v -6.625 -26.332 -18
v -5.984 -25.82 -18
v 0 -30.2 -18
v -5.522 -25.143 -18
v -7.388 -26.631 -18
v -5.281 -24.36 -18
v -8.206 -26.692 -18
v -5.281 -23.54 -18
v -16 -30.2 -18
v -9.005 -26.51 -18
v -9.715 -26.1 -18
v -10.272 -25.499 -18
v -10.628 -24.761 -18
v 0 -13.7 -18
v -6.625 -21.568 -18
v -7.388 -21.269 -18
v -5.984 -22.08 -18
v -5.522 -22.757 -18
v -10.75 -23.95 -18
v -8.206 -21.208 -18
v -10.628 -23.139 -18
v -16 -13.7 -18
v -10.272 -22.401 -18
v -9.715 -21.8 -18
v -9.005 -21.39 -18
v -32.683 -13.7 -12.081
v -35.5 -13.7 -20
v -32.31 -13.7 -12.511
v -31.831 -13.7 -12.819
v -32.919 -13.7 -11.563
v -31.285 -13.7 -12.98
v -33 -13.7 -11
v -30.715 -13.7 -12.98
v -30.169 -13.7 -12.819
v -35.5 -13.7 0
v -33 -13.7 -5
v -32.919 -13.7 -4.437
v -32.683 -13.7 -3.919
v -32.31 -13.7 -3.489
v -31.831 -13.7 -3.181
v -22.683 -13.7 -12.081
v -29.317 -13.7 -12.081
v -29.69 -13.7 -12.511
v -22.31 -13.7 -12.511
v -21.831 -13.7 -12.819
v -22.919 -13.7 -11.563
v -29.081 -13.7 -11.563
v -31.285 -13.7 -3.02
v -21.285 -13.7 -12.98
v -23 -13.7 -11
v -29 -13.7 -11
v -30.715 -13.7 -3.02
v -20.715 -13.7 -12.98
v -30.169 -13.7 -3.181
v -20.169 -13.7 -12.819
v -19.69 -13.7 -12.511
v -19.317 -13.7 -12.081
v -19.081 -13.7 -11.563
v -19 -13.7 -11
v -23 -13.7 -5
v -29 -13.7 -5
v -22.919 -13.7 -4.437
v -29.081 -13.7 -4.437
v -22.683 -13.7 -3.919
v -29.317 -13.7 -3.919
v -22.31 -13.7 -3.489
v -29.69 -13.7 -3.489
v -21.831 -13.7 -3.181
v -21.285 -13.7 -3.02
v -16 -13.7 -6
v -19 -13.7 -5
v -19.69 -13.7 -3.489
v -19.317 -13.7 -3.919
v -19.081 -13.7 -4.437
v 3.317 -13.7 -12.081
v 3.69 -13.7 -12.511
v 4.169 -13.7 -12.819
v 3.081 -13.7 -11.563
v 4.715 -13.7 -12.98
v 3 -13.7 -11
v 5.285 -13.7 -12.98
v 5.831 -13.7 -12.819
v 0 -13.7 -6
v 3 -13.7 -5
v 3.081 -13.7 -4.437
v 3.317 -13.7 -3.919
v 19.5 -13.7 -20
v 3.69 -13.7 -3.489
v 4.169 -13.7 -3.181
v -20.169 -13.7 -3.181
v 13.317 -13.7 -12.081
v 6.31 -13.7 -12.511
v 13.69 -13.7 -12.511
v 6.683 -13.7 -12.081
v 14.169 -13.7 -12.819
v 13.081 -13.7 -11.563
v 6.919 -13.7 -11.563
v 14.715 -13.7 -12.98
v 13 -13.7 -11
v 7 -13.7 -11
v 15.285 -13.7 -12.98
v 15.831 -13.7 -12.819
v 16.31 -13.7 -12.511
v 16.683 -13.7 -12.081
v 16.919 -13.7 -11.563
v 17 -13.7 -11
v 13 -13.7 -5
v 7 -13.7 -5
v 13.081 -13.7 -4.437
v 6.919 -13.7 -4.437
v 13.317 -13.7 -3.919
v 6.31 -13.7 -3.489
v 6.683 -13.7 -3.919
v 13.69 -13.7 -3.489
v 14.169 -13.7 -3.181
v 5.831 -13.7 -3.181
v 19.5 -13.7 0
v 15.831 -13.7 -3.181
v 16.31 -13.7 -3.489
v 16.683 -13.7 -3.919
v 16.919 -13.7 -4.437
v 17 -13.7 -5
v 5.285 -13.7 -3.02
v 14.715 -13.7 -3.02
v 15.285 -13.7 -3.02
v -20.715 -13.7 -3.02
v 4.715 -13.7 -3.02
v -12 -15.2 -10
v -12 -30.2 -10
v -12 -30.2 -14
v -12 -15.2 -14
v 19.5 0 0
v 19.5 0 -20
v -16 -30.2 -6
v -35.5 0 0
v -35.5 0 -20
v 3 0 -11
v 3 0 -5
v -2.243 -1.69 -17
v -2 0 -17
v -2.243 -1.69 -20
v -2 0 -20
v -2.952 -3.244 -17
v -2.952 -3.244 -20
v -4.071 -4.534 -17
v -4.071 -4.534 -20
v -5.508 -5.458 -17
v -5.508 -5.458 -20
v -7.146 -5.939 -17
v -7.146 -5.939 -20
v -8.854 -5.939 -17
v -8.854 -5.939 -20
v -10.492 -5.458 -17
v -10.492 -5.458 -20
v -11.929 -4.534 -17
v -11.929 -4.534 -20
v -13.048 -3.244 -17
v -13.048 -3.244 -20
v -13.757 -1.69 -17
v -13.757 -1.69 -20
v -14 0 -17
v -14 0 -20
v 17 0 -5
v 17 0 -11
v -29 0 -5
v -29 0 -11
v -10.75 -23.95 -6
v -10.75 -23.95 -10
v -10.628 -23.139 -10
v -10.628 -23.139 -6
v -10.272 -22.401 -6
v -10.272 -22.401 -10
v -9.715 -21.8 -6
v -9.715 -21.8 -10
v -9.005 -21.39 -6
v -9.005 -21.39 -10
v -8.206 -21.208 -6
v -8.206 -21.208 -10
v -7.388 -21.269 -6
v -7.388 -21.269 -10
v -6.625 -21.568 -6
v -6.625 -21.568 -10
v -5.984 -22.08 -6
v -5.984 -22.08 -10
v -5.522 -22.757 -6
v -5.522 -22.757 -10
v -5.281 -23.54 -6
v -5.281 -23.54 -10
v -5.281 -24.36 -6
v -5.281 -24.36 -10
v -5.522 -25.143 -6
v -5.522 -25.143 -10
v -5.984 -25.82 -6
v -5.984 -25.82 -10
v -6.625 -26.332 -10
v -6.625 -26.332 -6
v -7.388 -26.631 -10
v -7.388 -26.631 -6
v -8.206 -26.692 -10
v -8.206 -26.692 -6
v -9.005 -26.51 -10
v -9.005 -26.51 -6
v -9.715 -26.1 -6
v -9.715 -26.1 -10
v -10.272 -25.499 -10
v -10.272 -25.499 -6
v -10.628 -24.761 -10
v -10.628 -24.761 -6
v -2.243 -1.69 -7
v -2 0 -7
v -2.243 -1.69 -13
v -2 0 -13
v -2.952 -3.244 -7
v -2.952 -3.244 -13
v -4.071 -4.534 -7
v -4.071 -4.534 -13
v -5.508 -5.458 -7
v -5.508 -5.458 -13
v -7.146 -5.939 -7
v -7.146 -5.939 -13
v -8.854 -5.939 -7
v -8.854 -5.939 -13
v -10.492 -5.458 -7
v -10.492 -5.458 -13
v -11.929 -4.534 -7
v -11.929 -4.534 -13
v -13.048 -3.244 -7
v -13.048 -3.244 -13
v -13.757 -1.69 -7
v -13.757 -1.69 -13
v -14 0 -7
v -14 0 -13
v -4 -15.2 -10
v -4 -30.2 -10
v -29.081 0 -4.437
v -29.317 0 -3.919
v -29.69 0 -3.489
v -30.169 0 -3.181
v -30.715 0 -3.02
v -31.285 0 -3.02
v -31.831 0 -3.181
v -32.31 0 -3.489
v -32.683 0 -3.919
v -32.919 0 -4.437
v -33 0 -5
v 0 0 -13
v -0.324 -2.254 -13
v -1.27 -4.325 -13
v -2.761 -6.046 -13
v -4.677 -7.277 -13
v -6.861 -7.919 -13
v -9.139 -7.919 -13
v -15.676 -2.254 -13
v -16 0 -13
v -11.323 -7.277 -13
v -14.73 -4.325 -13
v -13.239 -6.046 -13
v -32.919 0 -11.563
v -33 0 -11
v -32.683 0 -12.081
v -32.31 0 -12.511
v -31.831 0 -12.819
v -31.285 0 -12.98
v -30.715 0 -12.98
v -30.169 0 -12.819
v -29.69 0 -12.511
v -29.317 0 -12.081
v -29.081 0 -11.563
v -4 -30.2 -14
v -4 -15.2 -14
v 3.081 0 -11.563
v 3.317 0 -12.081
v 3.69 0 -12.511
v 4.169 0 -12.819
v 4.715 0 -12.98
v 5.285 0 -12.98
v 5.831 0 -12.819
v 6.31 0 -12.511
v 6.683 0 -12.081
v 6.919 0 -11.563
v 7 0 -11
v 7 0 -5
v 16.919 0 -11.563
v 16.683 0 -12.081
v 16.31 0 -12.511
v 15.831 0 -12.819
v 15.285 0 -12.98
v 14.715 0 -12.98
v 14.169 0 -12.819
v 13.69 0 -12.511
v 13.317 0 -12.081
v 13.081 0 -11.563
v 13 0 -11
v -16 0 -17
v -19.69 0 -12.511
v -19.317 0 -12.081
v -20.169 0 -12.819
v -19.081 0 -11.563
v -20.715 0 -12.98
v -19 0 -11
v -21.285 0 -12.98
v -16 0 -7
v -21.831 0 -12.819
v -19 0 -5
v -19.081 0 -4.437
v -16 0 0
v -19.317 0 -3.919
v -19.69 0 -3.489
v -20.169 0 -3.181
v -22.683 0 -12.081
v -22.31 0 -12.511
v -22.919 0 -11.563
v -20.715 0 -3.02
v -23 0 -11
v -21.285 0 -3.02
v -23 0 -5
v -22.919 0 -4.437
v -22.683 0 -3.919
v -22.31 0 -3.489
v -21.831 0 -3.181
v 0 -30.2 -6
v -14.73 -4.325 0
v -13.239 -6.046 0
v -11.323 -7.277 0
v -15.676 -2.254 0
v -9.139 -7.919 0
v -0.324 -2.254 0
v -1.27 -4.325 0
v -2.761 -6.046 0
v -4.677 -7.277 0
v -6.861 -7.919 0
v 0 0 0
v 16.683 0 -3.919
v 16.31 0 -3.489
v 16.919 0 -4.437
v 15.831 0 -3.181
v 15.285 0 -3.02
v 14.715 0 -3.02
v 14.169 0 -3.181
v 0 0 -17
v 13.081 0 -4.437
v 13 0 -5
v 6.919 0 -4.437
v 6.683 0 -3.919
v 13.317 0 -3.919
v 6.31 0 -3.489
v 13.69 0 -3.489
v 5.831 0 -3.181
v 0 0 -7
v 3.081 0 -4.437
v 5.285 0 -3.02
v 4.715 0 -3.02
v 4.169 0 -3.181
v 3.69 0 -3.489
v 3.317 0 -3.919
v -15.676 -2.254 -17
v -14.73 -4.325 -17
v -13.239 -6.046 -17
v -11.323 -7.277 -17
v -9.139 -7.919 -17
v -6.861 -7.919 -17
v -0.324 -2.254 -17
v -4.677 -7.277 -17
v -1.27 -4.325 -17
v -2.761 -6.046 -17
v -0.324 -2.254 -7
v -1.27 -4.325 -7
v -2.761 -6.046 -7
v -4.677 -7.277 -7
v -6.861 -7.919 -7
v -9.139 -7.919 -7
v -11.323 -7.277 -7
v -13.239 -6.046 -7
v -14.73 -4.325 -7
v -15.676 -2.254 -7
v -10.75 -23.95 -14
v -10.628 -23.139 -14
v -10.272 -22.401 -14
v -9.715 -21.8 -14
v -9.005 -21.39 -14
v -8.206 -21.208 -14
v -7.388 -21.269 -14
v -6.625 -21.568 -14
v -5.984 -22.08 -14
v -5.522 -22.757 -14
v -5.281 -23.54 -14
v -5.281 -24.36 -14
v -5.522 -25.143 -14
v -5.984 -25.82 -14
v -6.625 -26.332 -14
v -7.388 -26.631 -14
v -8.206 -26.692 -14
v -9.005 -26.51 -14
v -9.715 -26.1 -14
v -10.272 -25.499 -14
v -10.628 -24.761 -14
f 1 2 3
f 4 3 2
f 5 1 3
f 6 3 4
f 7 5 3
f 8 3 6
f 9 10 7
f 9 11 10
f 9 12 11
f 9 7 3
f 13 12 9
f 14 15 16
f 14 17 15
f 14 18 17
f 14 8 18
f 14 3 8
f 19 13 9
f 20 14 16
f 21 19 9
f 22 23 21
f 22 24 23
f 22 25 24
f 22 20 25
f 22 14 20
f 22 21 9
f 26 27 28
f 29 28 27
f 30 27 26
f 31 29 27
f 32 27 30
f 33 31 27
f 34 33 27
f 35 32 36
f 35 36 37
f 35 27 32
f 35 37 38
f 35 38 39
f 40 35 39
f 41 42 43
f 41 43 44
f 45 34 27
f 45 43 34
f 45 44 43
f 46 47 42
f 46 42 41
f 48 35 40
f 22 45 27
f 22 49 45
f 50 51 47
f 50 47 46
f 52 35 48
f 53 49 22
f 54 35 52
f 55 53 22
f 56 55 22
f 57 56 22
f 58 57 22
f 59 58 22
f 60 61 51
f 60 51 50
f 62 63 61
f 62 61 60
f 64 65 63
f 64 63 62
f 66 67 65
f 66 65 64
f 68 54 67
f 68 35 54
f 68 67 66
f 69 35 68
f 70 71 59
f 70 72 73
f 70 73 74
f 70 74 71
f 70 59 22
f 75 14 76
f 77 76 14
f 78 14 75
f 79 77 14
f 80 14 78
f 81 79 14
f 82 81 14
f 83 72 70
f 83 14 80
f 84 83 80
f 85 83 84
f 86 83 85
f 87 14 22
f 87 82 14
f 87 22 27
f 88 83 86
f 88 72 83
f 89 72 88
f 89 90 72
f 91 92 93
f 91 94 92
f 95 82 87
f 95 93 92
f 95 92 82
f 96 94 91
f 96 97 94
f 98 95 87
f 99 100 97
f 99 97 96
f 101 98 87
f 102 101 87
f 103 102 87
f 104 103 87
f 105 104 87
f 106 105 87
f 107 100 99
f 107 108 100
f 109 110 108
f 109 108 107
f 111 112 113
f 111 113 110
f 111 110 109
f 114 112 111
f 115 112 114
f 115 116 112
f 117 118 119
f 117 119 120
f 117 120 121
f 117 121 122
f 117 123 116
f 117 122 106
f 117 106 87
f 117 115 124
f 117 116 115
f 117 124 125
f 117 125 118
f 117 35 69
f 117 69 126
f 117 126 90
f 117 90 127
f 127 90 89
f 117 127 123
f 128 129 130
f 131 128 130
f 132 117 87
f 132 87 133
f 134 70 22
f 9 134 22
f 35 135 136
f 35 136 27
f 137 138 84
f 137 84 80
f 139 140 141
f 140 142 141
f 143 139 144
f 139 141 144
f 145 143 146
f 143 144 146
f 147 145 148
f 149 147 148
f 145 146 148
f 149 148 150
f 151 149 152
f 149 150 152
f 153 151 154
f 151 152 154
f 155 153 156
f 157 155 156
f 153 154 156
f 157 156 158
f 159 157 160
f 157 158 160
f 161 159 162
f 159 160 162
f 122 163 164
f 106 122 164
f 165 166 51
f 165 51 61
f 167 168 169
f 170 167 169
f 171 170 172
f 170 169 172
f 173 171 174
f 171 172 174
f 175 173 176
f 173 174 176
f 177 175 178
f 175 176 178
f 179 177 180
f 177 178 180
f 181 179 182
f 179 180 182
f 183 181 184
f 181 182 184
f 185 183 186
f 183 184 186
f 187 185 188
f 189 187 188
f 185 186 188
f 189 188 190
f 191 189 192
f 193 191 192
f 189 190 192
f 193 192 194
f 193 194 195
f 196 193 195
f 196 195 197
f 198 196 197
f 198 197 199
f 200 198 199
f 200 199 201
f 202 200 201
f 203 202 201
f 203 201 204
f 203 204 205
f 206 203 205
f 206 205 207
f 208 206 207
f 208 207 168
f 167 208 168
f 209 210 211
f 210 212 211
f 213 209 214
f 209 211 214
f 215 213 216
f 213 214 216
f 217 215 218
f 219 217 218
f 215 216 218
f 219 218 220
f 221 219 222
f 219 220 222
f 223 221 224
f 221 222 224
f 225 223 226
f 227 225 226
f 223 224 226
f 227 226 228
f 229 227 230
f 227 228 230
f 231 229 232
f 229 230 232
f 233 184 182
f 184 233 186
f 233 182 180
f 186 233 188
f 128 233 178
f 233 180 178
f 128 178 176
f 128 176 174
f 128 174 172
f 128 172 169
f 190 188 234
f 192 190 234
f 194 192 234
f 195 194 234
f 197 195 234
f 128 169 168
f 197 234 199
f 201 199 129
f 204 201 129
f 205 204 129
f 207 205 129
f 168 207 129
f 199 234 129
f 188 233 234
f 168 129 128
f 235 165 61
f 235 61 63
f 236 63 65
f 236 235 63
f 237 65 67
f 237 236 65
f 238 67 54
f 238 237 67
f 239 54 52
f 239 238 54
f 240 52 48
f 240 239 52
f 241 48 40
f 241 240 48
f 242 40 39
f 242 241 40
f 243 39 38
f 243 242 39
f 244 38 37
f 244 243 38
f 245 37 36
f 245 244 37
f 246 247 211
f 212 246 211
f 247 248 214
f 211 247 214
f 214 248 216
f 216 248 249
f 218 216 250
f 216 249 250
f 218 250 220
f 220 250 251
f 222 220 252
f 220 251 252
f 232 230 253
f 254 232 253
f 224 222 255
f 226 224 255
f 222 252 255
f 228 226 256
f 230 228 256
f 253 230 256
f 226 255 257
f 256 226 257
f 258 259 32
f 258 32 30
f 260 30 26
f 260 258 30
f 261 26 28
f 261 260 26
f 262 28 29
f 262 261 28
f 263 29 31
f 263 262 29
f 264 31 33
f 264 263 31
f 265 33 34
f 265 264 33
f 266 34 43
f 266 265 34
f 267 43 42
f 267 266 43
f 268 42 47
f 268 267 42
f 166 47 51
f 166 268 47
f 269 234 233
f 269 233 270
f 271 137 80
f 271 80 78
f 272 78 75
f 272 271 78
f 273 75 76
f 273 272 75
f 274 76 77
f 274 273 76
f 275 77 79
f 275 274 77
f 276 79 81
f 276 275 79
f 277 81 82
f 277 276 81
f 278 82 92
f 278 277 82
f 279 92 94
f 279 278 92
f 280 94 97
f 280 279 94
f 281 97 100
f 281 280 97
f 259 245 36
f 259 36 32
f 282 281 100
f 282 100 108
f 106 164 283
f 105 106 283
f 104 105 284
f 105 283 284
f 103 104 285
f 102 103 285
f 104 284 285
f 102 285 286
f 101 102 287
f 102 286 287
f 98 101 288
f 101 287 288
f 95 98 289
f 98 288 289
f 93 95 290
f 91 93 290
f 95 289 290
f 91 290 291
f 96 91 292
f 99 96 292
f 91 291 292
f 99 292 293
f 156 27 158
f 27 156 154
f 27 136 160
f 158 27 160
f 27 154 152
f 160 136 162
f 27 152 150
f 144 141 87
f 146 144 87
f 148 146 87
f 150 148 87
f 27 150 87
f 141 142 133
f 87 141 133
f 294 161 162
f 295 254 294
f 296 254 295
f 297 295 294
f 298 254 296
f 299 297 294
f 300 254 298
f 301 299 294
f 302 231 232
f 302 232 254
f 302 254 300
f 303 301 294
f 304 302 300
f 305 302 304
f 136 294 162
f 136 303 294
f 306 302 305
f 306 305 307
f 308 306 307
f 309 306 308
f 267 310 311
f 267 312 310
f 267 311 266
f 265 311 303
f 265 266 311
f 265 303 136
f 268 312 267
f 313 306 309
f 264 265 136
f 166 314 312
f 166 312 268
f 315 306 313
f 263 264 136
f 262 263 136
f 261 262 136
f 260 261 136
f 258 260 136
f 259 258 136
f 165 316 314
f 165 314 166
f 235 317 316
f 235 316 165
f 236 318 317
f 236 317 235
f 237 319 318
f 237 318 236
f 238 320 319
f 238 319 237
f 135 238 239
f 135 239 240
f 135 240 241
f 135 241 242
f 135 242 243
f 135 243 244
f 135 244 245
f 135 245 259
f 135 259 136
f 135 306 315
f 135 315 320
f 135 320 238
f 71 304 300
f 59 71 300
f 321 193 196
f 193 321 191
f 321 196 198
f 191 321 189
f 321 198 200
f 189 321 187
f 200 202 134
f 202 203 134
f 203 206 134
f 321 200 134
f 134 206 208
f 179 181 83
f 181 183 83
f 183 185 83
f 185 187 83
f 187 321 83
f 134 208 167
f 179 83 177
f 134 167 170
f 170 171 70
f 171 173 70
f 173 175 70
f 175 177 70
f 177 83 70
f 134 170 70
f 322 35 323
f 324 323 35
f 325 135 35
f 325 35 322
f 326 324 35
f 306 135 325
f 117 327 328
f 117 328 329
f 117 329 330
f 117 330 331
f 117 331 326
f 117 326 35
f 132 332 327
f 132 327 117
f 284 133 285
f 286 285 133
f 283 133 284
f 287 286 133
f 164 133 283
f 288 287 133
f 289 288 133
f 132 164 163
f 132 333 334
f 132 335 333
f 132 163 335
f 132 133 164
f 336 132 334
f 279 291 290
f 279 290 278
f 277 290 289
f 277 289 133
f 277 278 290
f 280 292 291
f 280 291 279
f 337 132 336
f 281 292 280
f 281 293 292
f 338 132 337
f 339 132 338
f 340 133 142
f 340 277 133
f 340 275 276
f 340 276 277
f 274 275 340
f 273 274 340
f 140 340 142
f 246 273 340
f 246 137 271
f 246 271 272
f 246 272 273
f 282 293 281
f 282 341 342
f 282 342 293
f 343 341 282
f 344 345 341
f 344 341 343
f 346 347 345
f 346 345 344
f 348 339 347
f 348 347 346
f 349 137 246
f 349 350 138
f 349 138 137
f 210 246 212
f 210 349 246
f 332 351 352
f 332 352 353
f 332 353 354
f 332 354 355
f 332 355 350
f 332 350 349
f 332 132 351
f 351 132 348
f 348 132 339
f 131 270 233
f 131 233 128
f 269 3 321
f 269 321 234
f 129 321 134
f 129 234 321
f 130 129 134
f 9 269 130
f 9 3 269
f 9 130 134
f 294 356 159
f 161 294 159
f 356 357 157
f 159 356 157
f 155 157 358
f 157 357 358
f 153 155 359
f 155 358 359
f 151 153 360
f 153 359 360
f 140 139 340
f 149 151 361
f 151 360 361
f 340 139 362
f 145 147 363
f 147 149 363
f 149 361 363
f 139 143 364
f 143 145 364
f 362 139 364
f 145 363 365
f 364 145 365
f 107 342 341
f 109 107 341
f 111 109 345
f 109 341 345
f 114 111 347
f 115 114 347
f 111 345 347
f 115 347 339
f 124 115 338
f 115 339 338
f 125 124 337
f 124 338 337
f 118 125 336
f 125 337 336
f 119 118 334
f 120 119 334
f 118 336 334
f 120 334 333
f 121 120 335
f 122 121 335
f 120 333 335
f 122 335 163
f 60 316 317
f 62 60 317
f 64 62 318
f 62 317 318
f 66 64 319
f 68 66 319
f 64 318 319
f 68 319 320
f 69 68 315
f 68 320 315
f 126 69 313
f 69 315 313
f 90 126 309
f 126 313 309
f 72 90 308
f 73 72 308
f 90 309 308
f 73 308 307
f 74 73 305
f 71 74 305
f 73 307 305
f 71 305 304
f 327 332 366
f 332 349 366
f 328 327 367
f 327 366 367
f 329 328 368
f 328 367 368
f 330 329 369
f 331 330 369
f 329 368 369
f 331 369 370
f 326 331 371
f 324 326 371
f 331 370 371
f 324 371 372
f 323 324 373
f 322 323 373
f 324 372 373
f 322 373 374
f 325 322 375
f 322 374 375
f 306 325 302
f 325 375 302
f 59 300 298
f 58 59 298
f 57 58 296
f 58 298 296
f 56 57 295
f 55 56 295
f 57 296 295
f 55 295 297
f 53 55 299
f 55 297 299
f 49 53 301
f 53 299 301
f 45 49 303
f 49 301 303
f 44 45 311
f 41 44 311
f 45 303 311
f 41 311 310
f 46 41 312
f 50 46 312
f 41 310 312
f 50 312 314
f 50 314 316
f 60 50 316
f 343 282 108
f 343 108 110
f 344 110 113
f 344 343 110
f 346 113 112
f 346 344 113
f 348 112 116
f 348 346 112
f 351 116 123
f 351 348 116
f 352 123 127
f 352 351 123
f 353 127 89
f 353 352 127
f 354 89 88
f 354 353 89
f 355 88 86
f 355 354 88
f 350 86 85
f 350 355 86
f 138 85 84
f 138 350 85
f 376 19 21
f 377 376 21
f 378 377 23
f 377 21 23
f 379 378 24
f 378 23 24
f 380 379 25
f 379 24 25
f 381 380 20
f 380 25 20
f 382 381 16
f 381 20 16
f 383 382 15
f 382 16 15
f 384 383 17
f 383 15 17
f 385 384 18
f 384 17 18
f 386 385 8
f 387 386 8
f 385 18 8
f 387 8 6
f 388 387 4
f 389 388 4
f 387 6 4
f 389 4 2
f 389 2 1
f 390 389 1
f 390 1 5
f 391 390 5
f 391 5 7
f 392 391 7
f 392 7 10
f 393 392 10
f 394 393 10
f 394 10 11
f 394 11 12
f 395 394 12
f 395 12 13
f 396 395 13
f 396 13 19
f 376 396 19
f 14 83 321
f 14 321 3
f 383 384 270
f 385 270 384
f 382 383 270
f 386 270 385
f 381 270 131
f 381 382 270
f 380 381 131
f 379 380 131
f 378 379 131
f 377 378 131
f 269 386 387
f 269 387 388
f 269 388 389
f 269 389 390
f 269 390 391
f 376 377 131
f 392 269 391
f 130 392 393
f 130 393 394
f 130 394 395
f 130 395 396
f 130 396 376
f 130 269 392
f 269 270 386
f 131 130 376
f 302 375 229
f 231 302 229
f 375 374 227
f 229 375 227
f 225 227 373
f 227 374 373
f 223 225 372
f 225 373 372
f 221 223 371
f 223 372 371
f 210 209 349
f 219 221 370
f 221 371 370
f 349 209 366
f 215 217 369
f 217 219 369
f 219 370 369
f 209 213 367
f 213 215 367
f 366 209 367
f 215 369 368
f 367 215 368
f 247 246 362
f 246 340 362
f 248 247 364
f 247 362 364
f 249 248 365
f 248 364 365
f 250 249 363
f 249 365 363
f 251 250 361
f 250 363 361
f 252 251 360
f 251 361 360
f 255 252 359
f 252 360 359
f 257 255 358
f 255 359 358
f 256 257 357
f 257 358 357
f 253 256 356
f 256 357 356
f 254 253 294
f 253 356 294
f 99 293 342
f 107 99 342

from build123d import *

# Parameters (mm, degrees)
REVOLVE1_ANGLE      = 180
BOSS_EXTRUDE4_START = -20
BOSS_EXTRUDE4_DEPTH = 20
CUT_EXTRUDE4_DEPTH  = 20
SKETCH12_W          = 16
SKETCH12_H          = 12
BOSS_EXTRUDE6_DEPTH = 16.5
SKETCH13_W          = 8
SKETCH13_H          = 4
CUT_EXTRUDE6_DEPTH  = 15
SKETCH14_R          = 2.75
CUT_EXTRUDE7_DEPTH  = 15


with BuildPart() as part:
    # Sketch1 → Revolve1 (revolve)
    with BuildSketch(Plane(origin=(0, 0, 0), x_dir=(1, 0, 0), z_dir=(0, 1, 0))):
        Polygon((0, 0), (0, 7), (-2, 7), (-2, 13), (0, 13), (0, 17), (-2, 17), (-2, 20), (4, 20), (4, 17), (4, 0), align=None)
    revolve(axis=Axis((-8, 0, 0), (0, 0, -1)), revolution_arc=REVOLVE1_ANGLE)

    # Sketch8 → Boss-Extrude4 (add)
    with BuildSketch(Plane(origin=(0, 0, -20), x_dir=(-1, 0, 0), z_dir=(0, 0, -1)).offset(BOSS_EXTRUDE4_START)):
        with BuildLine():
            Line((20, 0), (35.5, 0))
            Line((35.5, 0), (35.5, -13.7))
            Line((35.5, -13.7), (-19.5, -13.7))
            Line((-19.5, -13.7), (-19.5, 0))
            Line((-19.5, 0), (-4, 0))
            ThreePointArc((-4, 0), (8, -12), (20, 0))
        make_face()
    extrude(amount=BOSS_EXTRUDE4_DEPTH)

    # Sketch9 → Cut-Extrude4 (cut)
    with BuildSketch(Plane(origin=(0, 0, 0), x_dir=(1, 0, 0), z_dir=(0, 1, 0))):
        with BuildLine():
            Line((-33, 5), (-33, 11))
            ThreePointArc((-33, 11), (-31, 13), (-29, 11))
            Line((-29, 11), (-29, 5))
            ThreePointArc((-29, 5), (-31, 3), (-33, 5))
        make_face()
        with BuildLine():
            Line((-19, 5), (-19, 11))
            ThreePointArc((-19, 11), (-21, 13), (-23, 11))
            Line((-23, 11), (-23, 5))
            ThreePointArc((-23, 5), (-21, 3), (-19, 5))
        make_face()
        with BuildLine():
            Line((3, 5), (3, 11))
            ThreePointArc((3, 11), (5, 13), (7, 11))
            Line((7, 11), (7, 5))
            ThreePointArc((7, 5), (5, 3), (3, 5))
        make_face()
        with BuildLine():
            Line((17, 5), (17, 11))
            ThreePointArc((17, 11), (15, 13), (13, 11))
            Line((13, 11), (13, 5))
            ThreePointArc((13, 5), (15, 3), (17, 5))
        make_face()
    extrude(amount=-CUT_EXTRUDE4_DEPTH, mode=Mode.SUBTRACT)

    # Sketch12 → Boss-Extrude6 (add)
    with BuildSketch(Plane(origin=(0, -13.7, 0), x_dir=(-1, 0, 0), z_dir=(0, -1, 0))):
        with Locations((8, 12)):
            Rectangle(SKETCH12_W, SKETCH12_H)
    extrude(amount=BOSS_EXTRUDE6_DEPTH)

    # Sketch13 → Cut-Extrude6 (cut)
    with BuildSketch(Plane(origin=(0, -30.2, 0), x_dir=(-1, 0, 0), z_dir=(0, -1, 0))):
        with Locations((8, 12)):
            Rectangle(SKETCH13_W, SKETCH13_H)
    extrude(amount=-CUT_EXTRUDE6_DEPTH, mode=Mode.SUBTRACT)

    # Sketch14 → Cut-Extrude7 (cut)
    with BuildSketch(Plane(origin=(0, 0, -18), x_dir=(-1, 0, 0), z_dir=(0, 0, -1))):
        with Locations((8, -23.95)):
            Circle(SKETCH14_R)
    extrude(amount=-CUT_EXTRUDE7_DEPTH, mode=Mode.SUBTRACT)


solid = part.part
